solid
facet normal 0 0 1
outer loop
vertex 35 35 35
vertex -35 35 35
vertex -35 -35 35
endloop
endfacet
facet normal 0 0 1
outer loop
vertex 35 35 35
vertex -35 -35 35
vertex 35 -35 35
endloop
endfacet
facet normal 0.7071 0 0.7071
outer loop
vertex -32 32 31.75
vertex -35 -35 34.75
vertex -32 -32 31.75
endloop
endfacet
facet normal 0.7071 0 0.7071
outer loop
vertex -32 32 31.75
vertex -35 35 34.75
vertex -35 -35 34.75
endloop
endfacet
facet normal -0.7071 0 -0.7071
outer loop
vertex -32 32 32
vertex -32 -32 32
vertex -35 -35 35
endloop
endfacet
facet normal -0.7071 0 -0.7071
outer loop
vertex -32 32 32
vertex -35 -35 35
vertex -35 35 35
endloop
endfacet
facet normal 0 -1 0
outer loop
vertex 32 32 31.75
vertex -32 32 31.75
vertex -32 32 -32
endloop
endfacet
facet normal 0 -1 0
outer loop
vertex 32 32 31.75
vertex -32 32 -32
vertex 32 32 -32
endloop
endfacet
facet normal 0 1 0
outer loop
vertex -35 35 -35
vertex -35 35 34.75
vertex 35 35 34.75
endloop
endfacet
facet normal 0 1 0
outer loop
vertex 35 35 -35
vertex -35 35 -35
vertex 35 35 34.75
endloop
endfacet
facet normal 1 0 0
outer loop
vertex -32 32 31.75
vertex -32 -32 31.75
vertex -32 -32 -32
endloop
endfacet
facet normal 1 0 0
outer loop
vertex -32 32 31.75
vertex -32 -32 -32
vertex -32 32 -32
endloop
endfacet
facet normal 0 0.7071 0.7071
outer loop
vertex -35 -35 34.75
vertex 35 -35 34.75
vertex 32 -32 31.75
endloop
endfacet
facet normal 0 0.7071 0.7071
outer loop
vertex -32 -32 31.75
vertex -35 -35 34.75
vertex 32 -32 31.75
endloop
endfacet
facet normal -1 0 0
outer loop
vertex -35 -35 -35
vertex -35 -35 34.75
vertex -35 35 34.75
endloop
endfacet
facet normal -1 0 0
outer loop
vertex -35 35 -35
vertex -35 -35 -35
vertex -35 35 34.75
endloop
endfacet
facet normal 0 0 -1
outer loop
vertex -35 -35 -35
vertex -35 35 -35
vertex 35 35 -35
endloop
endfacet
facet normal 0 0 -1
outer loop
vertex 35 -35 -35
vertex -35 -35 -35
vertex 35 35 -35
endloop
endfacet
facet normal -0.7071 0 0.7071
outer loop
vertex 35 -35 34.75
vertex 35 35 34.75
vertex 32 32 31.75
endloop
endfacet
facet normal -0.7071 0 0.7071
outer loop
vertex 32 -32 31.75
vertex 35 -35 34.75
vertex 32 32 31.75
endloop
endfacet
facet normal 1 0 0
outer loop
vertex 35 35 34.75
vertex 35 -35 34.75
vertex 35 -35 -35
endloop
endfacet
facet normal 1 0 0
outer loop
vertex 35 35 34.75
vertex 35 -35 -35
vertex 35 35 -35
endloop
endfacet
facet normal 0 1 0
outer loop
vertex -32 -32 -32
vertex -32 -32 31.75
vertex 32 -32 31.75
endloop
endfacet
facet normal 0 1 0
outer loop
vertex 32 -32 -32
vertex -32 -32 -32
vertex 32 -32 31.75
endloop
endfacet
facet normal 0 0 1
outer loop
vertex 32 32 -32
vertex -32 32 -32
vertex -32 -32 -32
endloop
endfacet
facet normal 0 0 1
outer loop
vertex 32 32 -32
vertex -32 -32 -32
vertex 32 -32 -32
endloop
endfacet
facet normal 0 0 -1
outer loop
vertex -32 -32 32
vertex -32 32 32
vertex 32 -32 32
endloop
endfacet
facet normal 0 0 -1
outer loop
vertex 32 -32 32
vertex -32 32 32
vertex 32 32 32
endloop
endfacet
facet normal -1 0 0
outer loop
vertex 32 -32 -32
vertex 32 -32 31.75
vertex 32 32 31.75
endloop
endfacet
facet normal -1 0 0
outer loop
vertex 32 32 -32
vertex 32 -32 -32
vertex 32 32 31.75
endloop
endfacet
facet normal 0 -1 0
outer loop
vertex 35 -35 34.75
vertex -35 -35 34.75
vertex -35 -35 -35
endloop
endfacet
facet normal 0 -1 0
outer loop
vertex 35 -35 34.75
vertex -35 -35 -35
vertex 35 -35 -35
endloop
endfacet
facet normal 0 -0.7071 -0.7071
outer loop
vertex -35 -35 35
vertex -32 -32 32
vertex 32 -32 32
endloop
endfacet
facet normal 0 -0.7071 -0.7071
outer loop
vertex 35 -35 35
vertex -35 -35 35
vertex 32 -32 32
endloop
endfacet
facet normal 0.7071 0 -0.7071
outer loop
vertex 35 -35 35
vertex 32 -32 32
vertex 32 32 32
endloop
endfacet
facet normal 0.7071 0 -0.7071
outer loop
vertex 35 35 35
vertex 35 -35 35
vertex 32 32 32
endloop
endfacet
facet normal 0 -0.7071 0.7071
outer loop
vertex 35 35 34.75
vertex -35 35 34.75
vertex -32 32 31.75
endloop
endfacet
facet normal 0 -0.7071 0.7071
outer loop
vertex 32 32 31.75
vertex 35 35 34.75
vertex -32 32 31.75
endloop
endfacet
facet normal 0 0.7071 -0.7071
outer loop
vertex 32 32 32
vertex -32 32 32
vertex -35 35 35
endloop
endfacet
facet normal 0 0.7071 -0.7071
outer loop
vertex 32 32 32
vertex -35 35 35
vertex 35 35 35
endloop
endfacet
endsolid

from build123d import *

# Parameters (mm, degrees)
F0_W         = 70
F0_H         = 70
F1_DEPTH     = 35
F2_T         = -3
F3_W         = 70
F3_H         = 70
F4_DEPTH     = 3
F5_SIZE      = 2.99999
F6_T1_DEPTH  = 64
F6_T3_DEPTH  = 64
F6_T9_DEPTH  = 72.3579697109
F6_T15_DEPTH = 72.3579697109
F6_T24_DEPTH = 72.3579697109
F6_T30_DEPTH = 72.3579697109
F6_T39_DEPTH = 72.3579697109
F6_T45_DEPTH = 72.3579697109
F6_T54_DEPTH = 72.3579697109
F6_T60_DEPTH = 72.3579697109


# Not quite as in the source:
# - a fillet or chamfer that OpenCascade refuses, or shapes differently, is made with other operations: its cross-section is extruded or revolved along the edge and cut away or added
# - a fillet or chamfer is up to 0.001 mm smaller than in the source, because OpenCascade refuses the exact size


with BuildPart() as f1:
    # F0 (on Top) → F1 (new body, symmetric)
    with BuildSketch(Plane.XY):
        Rectangle(F0_W, F0_H)
    extrude(amount=F1_DEPTH, both=True)

    # F2
    f2_openings = [f1.faces().sort_by_distance(p)[0] for p in [
        (0, 0, 35),
    ]]
    offset(amount=F2_T, openings=f2_openings)

    # F6: chamfer of 3.25 on 4 edges, made by hand

    # F6_s2 → F6_t1 (cut)
    with BuildSketch(Plane.YZ.offset(-32)):
        Polygon((-35.25, 35), (-32, 31.75), (-32, 35), align=None)
        Polygon((35.25, 35), (32, 31.75), (32, 35), align=None)
    extrude(amount=F6_T1_DEPTH, mode=Mode.SUBTRACT)

    # F6_s4 → F6_t3 (cut)
    with BuildSketch(Plane.XZ.offset(-32)):
        Polygon((-35.25, 35), (-32, 31.75), (-32, 35), align=None)
        Polygon((35.25, 35), (32, 31.75), (32, 35), align=None)
    extrude(amount=F6_T3_DEPTH, mode=Mode.SUBTRACT)


with BuildPart() as f4:
    # F3 (on face) → F4 (new body)
    with BuildSketch(Plane.XY.offset(35)):
        Rectangle(F3_W, F3_H)
    extrude(amount=-F4_DEPTH)

    # F5 (size 3 in the source; OpenCascade refuses exactly that, so slightly less here)
    f5_edges = [f4.edges().sort_by_distance(p)[0] for p in [
        (0, 35, 32),
        (-35, 0, 32),
        (0, -35, 32),
        (35, 0, 32),
    ]]
    chamfer(f5_edges, length=F5_SIZE)


with BuildPart() as f6_tool7:
    # F6_s8 → F6_t9 (new body)
    with BuildSketch(Plane.YZ.offset(-40.3579697109)):
        Polygon((-35.25, 35), (-32, 31.75), (-32, 35), align=None)
    extrude(amount=F6_T9_DEPTH)

    split(bisect_by=Plane.XZ.offset(35), keep=Keep.BOTTOM)

    split(bisect_by=Plane.YZ.offset(-35), keep=Keep.TOP)

    split(bisect_by=Plane.YZ.offset(-32), keep=Keep.BOTTOM)


with BuildPart() as f6_tool13:
    # F6_s14 → F6_t15 (new body)
    with BuildSketch(Plane.XZ.offset(-32)):
        Polygon((-35.25, 35), (-32, 31.75), (-32, 35), align=None)
    extrude(amount=F6_T15_DEPTH)

    split(bisect_by=Plane.XZ.offset(35), keep=Keep.BOTTOM)

    split(bisect_by=Plane.YZ.offset(-35), keep=Keep.TOP)

    split(bisect_by=Plane.XZ.offset(32), keep=Keep.TOP)


with BuildPart() as f6_tool7_1:
    add(f6_tool7.part)

    # F6_t19: intersect F6_tool13
    add(f6_tool13.part, mode=Mode.INTERSECT)


with BuildPart() as f1_1:
    add(f1.part)

    # F6_t5: cut F6_tool7
    add(f6_tool7_1.part, mode=Mode.SUBTRACT)


with BuildPart() as f6_tool22:
    # F6_s23 → F6_t24 (new body)
    with BuildSketch(Plane.YZ.offset(-32)):
        Polygon((-35.25, 35), (-32, 31.75), (-32, 35), align=None)
    extrude(amount=F6_T24_DEPTH)

    split(bisect_by=Plane.XZ.offset(35), keep=Keep.BOTTOM)

    split(bisect_by=Plane.YZ.offset(35), keep=Keep.BOTTOM)

    split(bisect_by=Plane.YZ.offset(32), keep=Keep.TOP)


with BuildPart() as f6_tool28:
    # F6_s29 → F6_t30 (new body)
    with BuildSketch(Plane.XZ.offset(40.3579697109)):
        Polygon((35.25, 35), (32, 31.75), (32, 35), align=None)
    extrude(amount=-F6_T30_DEPTH)

    split(bisect_by=Plane.XZ.offset(35), keep=Keep.BOTTOM)

    split(bisect_by=Plane.YZ.offset(35), keep=Keep.BOTTOM)

    split(bisect_by=Plane.XZ.offset(32), keep=Keep.TOP)


with BuildPart() as f6_tool22_1:
    add(f6_tool22.part)

    # F6_t34: intersect F6_tool28
    add(f6_tool28.part, mode=Mode.INTERSECT)


with BuildPart() as f1_2:
    add(f1_1.part)

    # F6_t20: cut F6_tool22
    add(f6_tool22_1.part, mode=Mode.SUBTRACT)


with BuildPart() as f6_tool37:
    # F6_s38 → F6_t39 (new body)
    with BuildSketch(Plane.XZ.offset(-40.3579697109)):
        Polygon((-35.25, 35), (-32, 31.75), (-32, 35), align=None)
    extrude(amount=F6_T39_DEPTH)

    split(bisect_by=Plane.YZ.offset(-35), keep=Keep.TOP)

    split(bisect_by=Plane.XZ.offset(-35), keep=Keep.TOP)

    split(bisect_by=Plane.XZ.offset(-32), keep=Keep.BOTTOM)


with BuildPart() as f6_tool43:
    # F6_s44 → F6_t45 (new body)
    with BuildSketch(Plane.YZ.offset(32)):
        Polygon((35.25, 35), (32, 31.75), (32, 35), align=None)
    extrude(amount=-F6_T45_DEPTH)

    split(bisect_by=Plane.YZ.offset(-35), keep=Keep.TOP)

    split(bisect_by=Plane.XZ.offset(-35), keep=Keep.TOP)

    split(bisect_by=Plane.YZ.offset(-32), keep=Keep.BOTTOM)


with BuildPart() as f6_tool37_1:
    add(f6_tool37.part)

    # F6_t49: intersect F6_tool43
    add(f6_tool43.part, mode=Mode.INTERSECT)


with BuildPart() as f1_3:
    add(f1_2.part)

    # F6_t35: cut F6_tool37
    add(f6_tool37_1.part, mode=Mode.SUBTRACT)


with BuildPart() as f6_tool52:
    # F6_s53 → F6_t54 (new body)
    with BuildSketch(Plane.YZ.offset(40.3579697109)):
        Polygon((35.25, 35), (32, 31.75), (32, 35), align=None)
    extrude(amount=-F6_T54_DEPTH)

    split(bisect_by=Plane.XZ.offset(-35), keep=Keep.TOP)

    split(bisect_by=Plane.YZ.offset(35), keep=Keep.BOTTOM)

    split(bisect_by=Plane.YZ.offset(32), keep=Keep.TOP)


with BuildPart() as f6_tool58:
    # F6_s59 → F6_t60 (new body)
    with BuildSketch(Plane.XZ.offset(32)):
        Polygon((35.25, 35), (32, 31.75), (32, 35), align=None)
    extrude(amount=-F6_T60_DEPTH)

    split(bisect_by=Plane.XZ.offset(-35), keep=Keep.TOP)

    split(bisect_by=Plane.YZ.offset(35), keep=Keep.BOTTOM)

    split(bisect_by=Plane.XZ.offset(-32), keep=Keep.BOTTOM)


with BuildPart() as f6_tool52_1:
    add(f6_tool52.part)

    # F6_t64: intersect F6_tool58
    add(f6_tool58.part, mode=Mode.INTERSECT)


with BuildPart() as f1_4:
    add(f1_3.part)

    # F6_t50: cut F6_tool52
    add(f6_tool52_1.part, mode=Mode.SUBTRACT)


solid = Compound([f4.part, f1_4.part])
